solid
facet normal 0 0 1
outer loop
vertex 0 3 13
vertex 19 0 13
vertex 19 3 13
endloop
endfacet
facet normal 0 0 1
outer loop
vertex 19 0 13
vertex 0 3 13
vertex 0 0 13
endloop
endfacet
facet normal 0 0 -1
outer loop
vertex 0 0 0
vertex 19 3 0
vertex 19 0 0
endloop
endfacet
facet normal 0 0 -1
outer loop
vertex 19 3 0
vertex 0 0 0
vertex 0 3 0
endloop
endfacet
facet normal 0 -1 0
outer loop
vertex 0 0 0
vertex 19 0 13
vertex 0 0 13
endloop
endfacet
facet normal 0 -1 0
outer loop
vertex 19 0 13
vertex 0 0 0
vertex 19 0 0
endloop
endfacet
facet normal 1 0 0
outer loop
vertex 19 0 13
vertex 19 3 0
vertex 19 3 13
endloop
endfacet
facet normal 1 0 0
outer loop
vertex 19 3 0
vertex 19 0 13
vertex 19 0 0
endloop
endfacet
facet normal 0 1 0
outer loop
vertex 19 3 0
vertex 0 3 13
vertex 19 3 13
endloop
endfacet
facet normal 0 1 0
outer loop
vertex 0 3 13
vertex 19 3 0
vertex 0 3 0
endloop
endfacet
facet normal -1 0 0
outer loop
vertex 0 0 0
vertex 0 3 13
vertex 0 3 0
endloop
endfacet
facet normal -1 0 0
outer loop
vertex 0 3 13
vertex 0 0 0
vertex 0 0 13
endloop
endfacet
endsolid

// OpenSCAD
// Generated by SolidPython 1.0.1 on 2020-07-29 00:46:56


cube(size = [19, 3, 13]);
/***********************************************
*********      SolidPython code:      **********
************************************************
 
# import packages: SolidPython
from solid import *
from solid.utils import *
from itertools import chain, combinations, permutations


class Resize:

    def __init__(self, scad_file):
        self.scad_file = scad_file
        #self.scad_file = import_scad(scad_file)
        # cone/cylinder param:
        self.r1 = 0
        self.r2 = 0
        self.h = 0
        # rectangular prism param:
        self.w = 0
        self.l = 0
        # ellipse param:
        self.r = 0

    # import OpenScad code (file name corresponds to shape)


    # classify shape + parameters
    def assign(self, param1, param2, param3):
        if self.scad_file == 'cone.scad':
            self.r1 = param1
            self.r2 = param2
            self.h = param3
        elif self.scad_file == 'cylinder.scad':
            self.r1 = param1
            self.r2 = param2
            self.h = param3
        elif self.scad_file == 'rectangularPrism.scad':
            self.h = param1
            self.l = param2
            self.w = param3
        else:
            self.r = param1
            self.h = param2

    # resize parameters
    def iterate(self):
        x = range(3, 20, 2)
        i = 1
        if self.scad_file == 'cone.scad':
            tempList = list(permutations(x, 2))
            for temp in tempList:
                param1 = temp[0]
                param2 = temp[1]
                filepath = 'produced_scad_files/' + 'cone' + str(param1) + '_' + str(param2) + '_' + '.scad'
                scad_render_to_file(cylinder(h=param1, r1=param2, r2=0), filepath)

        elif self.scad_file == 'cylinder.scad':
            tempList = list(permutations(x, 3))
            for temp in tempList:
                param1 = temp[0]
                param2 = temp[1]
                filepath = 'produced_scad_files/' + 'cylinder' + str(param1) + '_' + str(param2) + '_' + '.scad'
                scad_render_to_file(cylinder(h=param1, r1=param2, r2=param2), filepath)

        elif self.scad_file == 'rectangularPrism.scad':
            tempList = list(permutations(x, 3))
            for temp in tempList:
                param1 = temp[0]
                param2 = temp[1]
                param3 = temp[2]
                filepath = 'produced_scad_files/' + 'rectangularPrism' + str(param1) + '_' + str(param2) + '_' + str(
                    param3) + '.scad'
                scad_render_to_file(cube(size=(param1, param2, param3)), filepath)

        elif self.scad_file == 'ellipse.scad':
            tempList = list(permutations(x, 4))
            for temp in tempList:
                param1 = temp[0]
                param2 = temp[1]
                param3 = temp[2]
                param4 = temp[3]
                filepath = 'produced_scad_files/' + 'ellipse' + str(param1) + '_' + str(param2) + '_' + str(param3) + '_' + str(param4) + '.scad'
                scad_render_to_file(scale([param1, param2, param3])(sphere(r=param4)), filepath)

    def render_to_scadfile(self):
        scad_render_to_file(scad, 'example.scad') 
 
************************************************/
